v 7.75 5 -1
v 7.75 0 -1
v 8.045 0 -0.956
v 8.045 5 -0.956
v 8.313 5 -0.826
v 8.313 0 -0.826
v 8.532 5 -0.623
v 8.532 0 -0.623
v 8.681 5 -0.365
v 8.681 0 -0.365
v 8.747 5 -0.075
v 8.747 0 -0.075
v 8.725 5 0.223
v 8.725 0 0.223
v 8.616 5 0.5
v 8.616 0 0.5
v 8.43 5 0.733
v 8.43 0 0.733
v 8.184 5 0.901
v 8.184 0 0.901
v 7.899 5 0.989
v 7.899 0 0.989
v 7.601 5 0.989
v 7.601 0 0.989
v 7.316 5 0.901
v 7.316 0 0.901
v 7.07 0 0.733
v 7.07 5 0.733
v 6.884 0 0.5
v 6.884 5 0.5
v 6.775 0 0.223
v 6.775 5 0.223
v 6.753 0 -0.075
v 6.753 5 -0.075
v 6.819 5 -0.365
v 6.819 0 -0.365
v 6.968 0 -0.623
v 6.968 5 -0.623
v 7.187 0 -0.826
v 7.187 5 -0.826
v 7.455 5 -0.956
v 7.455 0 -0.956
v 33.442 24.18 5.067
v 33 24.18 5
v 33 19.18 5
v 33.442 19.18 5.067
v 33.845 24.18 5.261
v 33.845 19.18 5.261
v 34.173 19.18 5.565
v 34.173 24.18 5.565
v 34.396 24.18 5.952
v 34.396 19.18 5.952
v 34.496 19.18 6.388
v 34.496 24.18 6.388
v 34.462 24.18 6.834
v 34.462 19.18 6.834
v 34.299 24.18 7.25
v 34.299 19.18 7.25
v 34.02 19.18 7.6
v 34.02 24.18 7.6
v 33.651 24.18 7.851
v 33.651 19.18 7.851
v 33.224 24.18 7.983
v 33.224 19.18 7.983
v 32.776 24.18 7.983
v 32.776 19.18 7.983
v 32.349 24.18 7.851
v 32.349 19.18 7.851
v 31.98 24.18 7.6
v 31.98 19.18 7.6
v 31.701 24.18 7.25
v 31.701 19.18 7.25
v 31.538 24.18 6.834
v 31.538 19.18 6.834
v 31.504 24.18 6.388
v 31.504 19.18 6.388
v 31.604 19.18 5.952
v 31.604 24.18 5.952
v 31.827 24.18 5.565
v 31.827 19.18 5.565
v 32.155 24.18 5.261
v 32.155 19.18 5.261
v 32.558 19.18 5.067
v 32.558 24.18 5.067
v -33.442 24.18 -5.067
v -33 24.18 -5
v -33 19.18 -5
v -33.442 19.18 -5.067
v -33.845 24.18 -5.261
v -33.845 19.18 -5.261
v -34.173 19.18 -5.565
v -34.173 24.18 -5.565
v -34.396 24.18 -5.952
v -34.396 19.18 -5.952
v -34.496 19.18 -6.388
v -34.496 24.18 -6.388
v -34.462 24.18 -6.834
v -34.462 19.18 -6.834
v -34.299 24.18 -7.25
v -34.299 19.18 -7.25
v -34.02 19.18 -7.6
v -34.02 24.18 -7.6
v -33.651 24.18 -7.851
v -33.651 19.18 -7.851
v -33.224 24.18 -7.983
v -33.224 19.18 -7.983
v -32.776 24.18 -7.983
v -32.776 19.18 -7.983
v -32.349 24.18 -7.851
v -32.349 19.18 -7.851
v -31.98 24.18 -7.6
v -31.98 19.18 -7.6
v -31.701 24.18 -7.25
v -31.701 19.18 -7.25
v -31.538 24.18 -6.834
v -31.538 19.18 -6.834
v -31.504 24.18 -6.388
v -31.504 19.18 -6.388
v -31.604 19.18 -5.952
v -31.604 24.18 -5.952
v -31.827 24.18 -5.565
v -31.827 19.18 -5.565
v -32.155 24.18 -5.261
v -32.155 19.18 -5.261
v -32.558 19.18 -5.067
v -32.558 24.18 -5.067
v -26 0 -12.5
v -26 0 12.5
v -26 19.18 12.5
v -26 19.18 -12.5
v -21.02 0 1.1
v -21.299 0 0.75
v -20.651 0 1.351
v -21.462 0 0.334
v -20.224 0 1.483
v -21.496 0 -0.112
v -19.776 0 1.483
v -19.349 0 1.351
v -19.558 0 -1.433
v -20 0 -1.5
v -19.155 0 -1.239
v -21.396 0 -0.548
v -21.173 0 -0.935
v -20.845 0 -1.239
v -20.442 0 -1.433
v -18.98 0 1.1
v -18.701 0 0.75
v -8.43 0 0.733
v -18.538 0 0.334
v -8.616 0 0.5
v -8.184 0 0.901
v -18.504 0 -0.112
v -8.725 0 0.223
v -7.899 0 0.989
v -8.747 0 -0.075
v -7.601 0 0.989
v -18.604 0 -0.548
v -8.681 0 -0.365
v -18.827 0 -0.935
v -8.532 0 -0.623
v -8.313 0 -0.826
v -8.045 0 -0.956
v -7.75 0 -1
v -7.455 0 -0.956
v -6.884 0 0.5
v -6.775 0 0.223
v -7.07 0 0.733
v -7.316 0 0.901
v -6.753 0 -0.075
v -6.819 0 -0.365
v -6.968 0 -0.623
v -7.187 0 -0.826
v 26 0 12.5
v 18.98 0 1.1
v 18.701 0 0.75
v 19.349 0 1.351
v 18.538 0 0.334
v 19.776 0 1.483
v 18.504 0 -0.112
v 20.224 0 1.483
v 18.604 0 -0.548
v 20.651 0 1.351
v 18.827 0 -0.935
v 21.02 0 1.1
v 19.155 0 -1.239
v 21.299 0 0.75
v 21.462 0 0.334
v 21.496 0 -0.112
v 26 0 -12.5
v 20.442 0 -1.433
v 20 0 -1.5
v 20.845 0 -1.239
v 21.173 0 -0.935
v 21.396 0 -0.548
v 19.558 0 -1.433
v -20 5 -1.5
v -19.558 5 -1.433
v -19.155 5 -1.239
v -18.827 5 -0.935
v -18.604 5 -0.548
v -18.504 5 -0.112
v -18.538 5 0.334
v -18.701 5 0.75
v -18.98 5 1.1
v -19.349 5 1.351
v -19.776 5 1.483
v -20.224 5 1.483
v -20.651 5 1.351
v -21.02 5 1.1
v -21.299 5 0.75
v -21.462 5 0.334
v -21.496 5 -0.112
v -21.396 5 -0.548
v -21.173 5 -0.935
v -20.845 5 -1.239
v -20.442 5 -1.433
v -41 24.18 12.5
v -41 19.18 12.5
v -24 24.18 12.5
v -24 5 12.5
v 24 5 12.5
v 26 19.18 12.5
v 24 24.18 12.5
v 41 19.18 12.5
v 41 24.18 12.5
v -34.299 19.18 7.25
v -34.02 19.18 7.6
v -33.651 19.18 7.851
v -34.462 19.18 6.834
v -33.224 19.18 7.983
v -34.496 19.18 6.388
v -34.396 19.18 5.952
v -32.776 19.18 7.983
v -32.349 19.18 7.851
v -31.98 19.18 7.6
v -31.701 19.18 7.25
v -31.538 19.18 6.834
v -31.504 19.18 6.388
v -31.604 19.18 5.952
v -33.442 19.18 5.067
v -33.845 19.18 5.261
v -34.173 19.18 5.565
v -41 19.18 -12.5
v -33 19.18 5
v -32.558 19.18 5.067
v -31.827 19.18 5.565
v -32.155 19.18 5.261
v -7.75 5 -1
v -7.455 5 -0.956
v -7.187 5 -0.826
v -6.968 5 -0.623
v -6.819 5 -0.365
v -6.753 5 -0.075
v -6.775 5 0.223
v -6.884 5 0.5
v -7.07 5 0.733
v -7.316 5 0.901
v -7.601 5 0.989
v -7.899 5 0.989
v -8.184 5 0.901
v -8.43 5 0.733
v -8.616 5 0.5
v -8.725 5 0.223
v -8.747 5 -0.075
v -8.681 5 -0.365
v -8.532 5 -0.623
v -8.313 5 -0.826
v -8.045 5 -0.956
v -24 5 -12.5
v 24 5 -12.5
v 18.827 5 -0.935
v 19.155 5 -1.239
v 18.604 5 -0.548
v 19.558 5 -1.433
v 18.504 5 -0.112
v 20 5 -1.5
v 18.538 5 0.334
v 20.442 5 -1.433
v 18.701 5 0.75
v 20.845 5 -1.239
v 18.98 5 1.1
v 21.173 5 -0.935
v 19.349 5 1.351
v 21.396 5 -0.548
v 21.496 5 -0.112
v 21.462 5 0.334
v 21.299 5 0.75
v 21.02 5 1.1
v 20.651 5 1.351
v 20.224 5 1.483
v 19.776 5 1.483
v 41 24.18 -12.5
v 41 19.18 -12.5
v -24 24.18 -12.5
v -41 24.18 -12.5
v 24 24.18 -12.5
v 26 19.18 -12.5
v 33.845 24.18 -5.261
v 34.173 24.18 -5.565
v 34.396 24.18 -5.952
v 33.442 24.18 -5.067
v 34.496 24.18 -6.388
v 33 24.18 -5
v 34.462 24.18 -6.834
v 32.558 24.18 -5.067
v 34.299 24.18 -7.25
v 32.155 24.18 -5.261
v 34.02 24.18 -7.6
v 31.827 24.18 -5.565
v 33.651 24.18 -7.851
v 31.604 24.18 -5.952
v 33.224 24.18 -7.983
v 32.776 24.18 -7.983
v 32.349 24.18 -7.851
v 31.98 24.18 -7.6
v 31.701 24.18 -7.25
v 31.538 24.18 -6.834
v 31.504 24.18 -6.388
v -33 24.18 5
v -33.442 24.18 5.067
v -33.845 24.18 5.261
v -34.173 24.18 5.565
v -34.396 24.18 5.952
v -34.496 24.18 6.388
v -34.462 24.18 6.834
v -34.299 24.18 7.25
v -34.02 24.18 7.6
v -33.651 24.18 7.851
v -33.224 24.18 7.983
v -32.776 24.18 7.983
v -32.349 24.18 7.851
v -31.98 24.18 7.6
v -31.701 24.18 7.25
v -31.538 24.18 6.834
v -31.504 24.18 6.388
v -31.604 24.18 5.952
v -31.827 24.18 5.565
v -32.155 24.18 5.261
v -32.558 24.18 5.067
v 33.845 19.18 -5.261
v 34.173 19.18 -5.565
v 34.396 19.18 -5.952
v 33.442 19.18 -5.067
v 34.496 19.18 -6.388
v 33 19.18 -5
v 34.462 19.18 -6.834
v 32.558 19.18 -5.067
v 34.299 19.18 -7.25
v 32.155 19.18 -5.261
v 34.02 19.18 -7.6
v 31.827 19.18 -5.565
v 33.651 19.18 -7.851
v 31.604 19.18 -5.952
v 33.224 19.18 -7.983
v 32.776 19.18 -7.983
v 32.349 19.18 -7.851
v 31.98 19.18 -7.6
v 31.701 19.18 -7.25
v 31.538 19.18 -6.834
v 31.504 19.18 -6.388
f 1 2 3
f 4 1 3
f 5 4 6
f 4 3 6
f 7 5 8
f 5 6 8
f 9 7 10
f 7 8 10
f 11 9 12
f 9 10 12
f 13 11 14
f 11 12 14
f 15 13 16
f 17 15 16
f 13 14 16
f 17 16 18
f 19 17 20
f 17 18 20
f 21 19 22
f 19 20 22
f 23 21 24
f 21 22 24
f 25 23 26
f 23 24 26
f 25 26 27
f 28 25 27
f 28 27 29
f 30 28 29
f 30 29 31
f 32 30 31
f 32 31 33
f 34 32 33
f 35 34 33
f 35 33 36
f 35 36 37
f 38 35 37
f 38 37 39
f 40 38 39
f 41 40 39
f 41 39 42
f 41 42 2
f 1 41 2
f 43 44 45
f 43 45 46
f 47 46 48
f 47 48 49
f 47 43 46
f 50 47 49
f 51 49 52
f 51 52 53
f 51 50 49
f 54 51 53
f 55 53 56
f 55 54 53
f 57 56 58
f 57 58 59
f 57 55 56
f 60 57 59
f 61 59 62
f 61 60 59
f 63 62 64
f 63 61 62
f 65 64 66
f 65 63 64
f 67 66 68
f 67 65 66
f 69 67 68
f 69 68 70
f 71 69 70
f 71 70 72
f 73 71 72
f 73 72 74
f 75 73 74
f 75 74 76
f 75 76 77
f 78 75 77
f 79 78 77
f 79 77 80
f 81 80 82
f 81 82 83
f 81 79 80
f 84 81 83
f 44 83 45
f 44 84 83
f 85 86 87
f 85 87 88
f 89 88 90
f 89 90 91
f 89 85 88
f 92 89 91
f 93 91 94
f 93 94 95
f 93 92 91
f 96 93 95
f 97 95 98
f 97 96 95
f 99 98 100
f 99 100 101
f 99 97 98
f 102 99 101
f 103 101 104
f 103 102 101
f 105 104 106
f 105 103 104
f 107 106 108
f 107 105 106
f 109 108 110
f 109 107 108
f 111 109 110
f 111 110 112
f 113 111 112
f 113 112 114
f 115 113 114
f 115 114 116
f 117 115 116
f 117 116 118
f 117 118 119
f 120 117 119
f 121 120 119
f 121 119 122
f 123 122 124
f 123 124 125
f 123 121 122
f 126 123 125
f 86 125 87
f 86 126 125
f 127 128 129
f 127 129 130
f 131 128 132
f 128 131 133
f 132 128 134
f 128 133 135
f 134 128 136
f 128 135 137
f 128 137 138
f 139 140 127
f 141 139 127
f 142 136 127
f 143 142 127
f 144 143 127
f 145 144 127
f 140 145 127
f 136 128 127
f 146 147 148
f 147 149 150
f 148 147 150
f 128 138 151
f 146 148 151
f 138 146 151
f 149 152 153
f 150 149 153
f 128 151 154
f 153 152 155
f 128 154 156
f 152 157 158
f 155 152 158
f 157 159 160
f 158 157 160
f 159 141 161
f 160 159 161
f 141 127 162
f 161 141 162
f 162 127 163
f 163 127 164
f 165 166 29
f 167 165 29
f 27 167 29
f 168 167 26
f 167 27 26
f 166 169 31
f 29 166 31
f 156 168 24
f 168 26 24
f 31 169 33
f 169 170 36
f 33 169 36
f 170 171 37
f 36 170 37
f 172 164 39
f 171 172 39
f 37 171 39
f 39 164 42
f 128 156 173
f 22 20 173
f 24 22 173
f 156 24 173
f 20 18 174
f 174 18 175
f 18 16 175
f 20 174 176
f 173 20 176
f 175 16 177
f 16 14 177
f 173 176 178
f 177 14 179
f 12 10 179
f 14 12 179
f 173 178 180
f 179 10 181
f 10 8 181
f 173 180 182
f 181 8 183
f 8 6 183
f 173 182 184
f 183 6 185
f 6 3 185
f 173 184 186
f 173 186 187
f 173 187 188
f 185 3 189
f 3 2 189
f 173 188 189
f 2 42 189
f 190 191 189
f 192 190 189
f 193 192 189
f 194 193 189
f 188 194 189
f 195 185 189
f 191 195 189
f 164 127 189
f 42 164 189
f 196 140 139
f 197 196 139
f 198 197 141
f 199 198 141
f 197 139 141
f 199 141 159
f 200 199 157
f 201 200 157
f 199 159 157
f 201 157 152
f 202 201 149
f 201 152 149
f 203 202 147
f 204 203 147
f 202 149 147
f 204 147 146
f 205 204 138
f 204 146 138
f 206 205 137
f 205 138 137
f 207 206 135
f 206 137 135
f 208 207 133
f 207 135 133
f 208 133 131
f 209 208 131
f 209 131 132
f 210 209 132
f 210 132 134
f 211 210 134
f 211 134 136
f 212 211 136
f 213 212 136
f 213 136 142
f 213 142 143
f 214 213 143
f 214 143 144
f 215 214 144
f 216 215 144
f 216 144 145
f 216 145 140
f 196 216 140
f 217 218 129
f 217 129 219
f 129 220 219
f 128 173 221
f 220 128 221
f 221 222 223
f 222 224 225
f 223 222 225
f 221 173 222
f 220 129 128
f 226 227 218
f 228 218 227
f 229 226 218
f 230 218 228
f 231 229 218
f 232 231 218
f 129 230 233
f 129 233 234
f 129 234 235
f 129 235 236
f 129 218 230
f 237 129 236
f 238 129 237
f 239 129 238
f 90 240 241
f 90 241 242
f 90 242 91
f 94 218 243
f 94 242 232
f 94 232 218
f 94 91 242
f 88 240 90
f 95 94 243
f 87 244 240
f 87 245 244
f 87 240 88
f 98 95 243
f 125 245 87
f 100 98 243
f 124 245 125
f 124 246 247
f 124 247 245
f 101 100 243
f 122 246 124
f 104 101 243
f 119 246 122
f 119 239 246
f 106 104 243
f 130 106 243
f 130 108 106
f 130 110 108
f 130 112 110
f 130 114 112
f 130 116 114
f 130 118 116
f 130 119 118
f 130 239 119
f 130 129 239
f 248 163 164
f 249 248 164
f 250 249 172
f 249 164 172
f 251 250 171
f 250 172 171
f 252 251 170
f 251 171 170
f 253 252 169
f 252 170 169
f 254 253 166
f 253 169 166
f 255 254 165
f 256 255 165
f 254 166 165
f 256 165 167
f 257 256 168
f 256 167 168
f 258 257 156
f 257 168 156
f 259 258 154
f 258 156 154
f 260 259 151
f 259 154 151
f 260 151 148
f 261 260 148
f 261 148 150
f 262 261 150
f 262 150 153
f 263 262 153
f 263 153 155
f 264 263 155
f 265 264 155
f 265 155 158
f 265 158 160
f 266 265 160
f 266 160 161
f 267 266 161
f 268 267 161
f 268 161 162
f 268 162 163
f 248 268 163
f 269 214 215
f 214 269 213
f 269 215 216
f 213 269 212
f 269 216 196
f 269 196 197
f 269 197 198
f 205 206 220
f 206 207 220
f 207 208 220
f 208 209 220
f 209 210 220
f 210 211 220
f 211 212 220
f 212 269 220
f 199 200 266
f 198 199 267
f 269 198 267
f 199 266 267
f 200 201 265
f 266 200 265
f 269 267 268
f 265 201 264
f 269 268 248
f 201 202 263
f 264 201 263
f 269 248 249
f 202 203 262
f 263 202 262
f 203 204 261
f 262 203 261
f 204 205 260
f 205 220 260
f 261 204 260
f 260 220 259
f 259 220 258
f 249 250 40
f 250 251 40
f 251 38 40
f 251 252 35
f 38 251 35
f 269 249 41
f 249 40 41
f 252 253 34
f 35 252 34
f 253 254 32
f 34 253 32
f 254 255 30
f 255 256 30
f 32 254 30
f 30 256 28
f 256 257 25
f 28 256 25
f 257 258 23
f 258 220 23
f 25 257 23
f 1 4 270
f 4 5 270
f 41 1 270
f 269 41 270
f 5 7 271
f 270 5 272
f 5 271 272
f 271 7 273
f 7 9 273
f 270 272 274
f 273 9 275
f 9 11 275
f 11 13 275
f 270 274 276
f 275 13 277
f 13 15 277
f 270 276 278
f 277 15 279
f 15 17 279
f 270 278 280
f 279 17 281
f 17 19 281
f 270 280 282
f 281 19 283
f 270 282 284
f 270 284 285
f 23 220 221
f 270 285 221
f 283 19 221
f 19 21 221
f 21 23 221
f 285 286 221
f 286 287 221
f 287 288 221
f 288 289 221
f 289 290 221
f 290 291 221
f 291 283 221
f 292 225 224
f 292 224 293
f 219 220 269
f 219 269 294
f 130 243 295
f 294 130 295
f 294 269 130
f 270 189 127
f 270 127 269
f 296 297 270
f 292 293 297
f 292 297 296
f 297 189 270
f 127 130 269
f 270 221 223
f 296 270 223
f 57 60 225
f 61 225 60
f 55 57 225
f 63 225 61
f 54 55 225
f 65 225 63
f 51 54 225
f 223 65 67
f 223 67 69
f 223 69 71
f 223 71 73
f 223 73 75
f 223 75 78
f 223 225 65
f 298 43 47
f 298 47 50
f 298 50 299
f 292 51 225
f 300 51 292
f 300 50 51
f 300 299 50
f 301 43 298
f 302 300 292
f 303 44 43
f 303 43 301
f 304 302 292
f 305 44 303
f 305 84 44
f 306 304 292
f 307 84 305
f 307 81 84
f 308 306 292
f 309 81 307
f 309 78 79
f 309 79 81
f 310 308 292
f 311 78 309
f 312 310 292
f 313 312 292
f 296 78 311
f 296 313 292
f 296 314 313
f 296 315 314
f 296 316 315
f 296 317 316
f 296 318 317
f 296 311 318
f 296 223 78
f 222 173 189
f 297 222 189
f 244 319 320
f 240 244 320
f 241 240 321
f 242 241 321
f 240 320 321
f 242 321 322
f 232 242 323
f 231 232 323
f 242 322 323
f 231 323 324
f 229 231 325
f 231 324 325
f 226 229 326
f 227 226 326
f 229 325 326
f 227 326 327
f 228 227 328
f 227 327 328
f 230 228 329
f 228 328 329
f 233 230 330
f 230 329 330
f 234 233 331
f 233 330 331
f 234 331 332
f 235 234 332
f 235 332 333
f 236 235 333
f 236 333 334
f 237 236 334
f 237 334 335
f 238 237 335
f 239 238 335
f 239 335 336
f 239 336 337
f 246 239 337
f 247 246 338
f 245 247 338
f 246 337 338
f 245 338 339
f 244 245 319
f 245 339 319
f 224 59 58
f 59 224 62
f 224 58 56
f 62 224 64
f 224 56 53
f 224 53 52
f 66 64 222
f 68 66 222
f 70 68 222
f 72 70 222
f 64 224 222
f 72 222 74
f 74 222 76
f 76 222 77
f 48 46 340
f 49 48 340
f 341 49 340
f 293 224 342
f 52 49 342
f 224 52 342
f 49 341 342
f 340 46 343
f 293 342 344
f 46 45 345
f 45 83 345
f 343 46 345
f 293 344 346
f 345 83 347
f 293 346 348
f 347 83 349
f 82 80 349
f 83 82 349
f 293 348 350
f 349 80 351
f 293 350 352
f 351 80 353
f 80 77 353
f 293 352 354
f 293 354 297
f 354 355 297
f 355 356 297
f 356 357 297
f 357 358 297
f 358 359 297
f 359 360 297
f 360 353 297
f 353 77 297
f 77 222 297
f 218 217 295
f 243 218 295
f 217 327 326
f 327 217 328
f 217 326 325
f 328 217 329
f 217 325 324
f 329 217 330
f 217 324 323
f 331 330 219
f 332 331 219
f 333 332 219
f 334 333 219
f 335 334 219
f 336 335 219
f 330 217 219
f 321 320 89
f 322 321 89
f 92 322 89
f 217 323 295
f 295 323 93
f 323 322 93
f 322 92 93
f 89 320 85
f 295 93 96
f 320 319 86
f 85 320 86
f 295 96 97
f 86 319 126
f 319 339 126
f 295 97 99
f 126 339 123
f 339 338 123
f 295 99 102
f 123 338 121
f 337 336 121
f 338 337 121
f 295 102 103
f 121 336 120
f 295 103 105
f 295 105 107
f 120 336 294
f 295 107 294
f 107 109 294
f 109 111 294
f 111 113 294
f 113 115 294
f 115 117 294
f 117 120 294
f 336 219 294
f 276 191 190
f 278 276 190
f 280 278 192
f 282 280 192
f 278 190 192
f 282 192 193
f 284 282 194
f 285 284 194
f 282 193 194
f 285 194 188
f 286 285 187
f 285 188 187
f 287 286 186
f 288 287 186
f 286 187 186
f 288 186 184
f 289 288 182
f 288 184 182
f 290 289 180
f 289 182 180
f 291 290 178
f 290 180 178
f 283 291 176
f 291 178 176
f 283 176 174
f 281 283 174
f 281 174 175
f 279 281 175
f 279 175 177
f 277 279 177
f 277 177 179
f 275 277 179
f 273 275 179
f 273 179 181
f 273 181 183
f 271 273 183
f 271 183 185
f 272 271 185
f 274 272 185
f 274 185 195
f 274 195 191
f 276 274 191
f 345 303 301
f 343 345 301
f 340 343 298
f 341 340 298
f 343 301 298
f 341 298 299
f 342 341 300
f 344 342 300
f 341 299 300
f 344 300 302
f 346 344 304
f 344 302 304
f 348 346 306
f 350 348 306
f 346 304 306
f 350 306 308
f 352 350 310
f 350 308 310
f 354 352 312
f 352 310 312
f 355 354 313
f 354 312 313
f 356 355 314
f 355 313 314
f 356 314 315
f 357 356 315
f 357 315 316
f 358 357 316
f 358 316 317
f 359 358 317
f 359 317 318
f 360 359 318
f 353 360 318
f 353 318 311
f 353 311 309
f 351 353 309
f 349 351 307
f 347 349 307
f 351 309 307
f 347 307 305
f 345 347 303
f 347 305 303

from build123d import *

# Parameters (mm, degrees)
SKETCH1_W               = 52
SKETCH1_H               = 25
BOSS_EXTRUDE1_DEPTH     = 24.18
SKETCH4_W               = 48
SKETCH4_H               = 21.11598097
CUT_EXTRUDE1_DEPTH      = 25
SKETCH6_R               = 1
SKETCH6_R_2             = 1.5
CUT_EXTRUDE5_DEPTH      = 24.18
SKETCH8_W               = 25
SKETCH8_H               = 5
BOSS_EXTRUDE2_DEPTH     = 15
SKETCH9_R               = 1.5
CUT_EXTRUDE7_DEPTH      = 5
MIRROR4_COPY_1_SKETCH_R = 1.5
MIRROR4_COPY_1_DEPTH    = 5


with BuildPart() as part:
    # Sketch1 → Boss-Extrude1 (new body)
    with BuildSketch(Plane(origin=(0, 0, 0), x_dir=(1, 0, 0), z_dir=(0, 1, 0))):
        Rectangle(SKETCH1_W, SKETCH1_H)
    extrude(amount=BOSS_EXTRUDE1_DEPTH)

    # Sketch4 → Cut-Extrude1 (cut)
    with BuildSketch(Plane.XY.offset(12.5)):
        with Locations((0, 15.557990485)):
            Rectangle(SKETCH4_W, SKETCH4_H)
    extrude(amount=-CUT_EXTRUDE1_DEPTH, mode=Mode.SUBTRACT)

    # Sketch6 → Cut-Extrude5 (cut)
    with BuildSketch(Plane.XZ):
        with Locations(Location((-7.75, 0, 0), (0, 0, 270))):
            Circle(SKETCH6_R)
        with Locations(Location((-20, 0, 0), (0, 0, 270))):
            Circle(SKETCH6_R_2)
        with Locations(Location((7.75, 0, 0), (0, 0, 270))):
            Circle(SKETCH6_R)
        with Locations(Location((20, 0, 0), (0, 0, 270))):
            Circle(SKETCH6_R_2)
    extrude(amount=-CUT_EXTRUDE5_DEPTH, mode=Mode.SUBTRACT)

    # Sketch8 → Boss-Extrude2 (add)
    with BuildSketch(Plane(origin=(26, 0, 0), x_dir=(0, 0, -1), z_dir=(1, 0, 0))):
        with Locations((0, 21.68)):
            Rectangle(SKETCH8_W, SKETCH8_H)
    boss_extrude2 = extrude(amount=BOSS_EXTRUDE2_DEPTH)

    # Sketch9 → Cut-Extrude7 (cut)
    with BuildSketch(Plane(origin=(0, 24.18, 0), x_dir=(1, 0, 0), z_dir=(0, 1, 0))):
        with Locations(Location((33, 6.5, 0), (0, 0, 270))):
            Circle(SKETCH9_R)
    cut_extrude7 = extrude(amount=-CUT_EXTRUDE7_DEPTH, mode=Mode.SUBTRACT)

    # Mirror3: Cut-Extrude7 across plane
    add(cut_extrude7.mirror(Plane.XY), mode=Mode.SUBTRACT)

    # Mirror4: Boss-Extrude2, Cut-Extrude7 across plane
    add(boss_extrude2.mirror(Plane(origin=(0, 0, 0), x_dir=(0, 0, 1), z_dir=(1, 0, 0))))
    add(cut_extrude7.mirror(Plane(origin=(0, 0, 0), x_dir=(0, 0, 1), z_dir=(1, 0, 0))), mode=Mode.SUBTRACT)

    # Mirror4 copy 1 sketch → Mirror4 copy 1 (cut)
    with BuildSketch(Plane(origin=(0, 24.18, 0), x_dir=(-1, 0, 0), z_dir=(0, 1, 0))):
        with Locations(Location((33, 6.5, 0), (0, 0, 270))):
            Circle(MIRROR4_COPY_1_SKETCH_R)
    extrude(amount=-MIRROR4_COPY_1_DEPTH, mode=Mode.SUBTRACT)


solid = part.part
